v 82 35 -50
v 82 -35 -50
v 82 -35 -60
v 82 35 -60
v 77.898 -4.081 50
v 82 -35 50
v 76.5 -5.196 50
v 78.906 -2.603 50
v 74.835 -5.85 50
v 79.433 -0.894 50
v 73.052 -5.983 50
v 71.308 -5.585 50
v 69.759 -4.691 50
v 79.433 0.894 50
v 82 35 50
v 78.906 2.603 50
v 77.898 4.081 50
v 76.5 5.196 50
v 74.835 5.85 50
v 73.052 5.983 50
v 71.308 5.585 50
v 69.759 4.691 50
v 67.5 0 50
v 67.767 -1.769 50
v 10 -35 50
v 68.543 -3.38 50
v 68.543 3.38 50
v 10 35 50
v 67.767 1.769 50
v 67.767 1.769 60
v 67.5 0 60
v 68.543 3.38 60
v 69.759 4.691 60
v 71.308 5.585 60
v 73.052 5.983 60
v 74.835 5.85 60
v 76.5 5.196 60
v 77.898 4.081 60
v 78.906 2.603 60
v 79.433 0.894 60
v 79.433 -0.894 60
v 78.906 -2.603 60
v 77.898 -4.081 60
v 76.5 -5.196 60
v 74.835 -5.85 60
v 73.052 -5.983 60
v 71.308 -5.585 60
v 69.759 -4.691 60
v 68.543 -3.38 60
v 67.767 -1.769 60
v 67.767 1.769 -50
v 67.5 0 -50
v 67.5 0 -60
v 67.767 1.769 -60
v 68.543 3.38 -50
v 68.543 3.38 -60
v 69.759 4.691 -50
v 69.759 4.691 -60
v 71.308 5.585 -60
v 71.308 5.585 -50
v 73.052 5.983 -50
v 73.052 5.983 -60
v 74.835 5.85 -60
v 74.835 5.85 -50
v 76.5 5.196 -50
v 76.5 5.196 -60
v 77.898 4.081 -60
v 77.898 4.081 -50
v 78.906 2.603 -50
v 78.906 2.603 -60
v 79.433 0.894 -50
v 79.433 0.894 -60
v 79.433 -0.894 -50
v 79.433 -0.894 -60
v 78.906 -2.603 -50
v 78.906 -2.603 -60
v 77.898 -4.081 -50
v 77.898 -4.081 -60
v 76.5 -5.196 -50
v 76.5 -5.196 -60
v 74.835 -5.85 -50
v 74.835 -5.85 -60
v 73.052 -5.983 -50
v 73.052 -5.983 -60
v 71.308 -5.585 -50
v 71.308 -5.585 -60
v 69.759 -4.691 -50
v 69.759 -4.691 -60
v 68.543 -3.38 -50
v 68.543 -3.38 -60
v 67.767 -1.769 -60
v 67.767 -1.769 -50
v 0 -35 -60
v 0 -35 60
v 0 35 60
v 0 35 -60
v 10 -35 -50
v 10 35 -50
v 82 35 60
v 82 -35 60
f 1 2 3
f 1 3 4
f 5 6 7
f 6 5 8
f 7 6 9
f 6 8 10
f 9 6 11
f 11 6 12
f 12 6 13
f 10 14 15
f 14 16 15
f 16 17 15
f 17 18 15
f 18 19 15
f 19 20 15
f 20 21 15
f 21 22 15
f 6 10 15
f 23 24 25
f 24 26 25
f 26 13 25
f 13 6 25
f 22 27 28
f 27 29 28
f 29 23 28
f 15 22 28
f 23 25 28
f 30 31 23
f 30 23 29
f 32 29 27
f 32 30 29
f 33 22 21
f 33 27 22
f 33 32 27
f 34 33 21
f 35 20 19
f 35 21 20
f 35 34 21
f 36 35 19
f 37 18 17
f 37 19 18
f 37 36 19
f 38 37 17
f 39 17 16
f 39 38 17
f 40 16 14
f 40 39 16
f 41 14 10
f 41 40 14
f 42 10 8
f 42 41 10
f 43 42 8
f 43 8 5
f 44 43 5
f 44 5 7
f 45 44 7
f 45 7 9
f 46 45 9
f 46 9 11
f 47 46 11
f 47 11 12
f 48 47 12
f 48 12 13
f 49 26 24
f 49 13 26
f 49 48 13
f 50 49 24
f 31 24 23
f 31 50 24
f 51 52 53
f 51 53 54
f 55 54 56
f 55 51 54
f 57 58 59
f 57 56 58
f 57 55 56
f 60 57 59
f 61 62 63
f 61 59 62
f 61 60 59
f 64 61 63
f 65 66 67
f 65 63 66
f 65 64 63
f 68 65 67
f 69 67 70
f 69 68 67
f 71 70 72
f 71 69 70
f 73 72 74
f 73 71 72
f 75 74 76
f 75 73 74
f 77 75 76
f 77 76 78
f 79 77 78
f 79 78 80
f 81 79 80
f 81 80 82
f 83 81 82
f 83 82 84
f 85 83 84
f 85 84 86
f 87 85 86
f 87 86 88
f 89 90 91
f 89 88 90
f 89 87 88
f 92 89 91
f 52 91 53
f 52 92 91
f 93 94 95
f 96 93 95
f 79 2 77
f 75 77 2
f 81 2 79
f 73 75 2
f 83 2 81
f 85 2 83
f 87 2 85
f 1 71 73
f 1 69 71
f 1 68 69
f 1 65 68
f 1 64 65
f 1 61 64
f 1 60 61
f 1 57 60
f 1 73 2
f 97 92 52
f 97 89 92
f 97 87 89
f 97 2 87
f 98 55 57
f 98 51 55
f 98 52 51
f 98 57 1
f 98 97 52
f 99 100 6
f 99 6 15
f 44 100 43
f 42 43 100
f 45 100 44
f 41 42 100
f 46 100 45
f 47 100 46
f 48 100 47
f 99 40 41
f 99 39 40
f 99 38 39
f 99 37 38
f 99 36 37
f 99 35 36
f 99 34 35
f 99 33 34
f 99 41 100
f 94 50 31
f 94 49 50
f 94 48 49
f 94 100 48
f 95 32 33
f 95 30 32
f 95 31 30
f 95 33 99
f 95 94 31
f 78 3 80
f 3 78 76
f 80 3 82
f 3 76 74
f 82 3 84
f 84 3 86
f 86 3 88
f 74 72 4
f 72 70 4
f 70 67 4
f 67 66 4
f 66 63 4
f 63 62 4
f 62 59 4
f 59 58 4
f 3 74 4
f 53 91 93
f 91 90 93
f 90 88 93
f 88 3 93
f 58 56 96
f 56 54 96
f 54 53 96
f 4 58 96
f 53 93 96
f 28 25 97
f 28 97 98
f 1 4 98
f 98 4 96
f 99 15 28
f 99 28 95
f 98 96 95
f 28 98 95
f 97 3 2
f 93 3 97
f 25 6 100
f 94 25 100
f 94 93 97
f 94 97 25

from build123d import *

# Parameters (mm, degrees)
SKETCH1_W               = 70
SKETCH1_H               = 120
BOSS_EXTRUDE3_DEPTH     = 10
SKETCH3_W               = 70
SKETCH3_H               = 10
BOSS_EXTRUDE4_DEPTH     = 72
CUT_EXTRUDE1_DEPTH      = 150.49581934
CUT_EXTRUDE1_DEPTH_BACK = 150.49581934
SKETCH4_R               = 6


with BuildPart() as part:
    # Sketch1 → Boss-Extrude3 (new body)
    with BuildSketch(Plane.YZ):
        Rectangle(SKETCH1_W, SKETCH1_H)
    extrude(amount=BOSS_EXTRUDE3_DEPTH)

    # Sketch3 → Boss-Extrude4 (add)
    with BuildSketch(Plane.YZ.offset(10)):
        with Locations((0, 55)):
            Rectangle(SKETCH3_W, SKETCH3_H)
        with Locations((0, -55)):
            Rectangle(SKETCH3_W, SKETCH3_H)
    extrude(amount=BOSS_EXTRUDE4_DEPTH)

    # Sketch4 → Cut-Extrude1 (cut, two sides: drawn at the far end of the back side and taken through both)
    with BuildSketch(Plane(origin=(0, 0, -60), x_dir=(1, 0, 0), z_dir=(0, 0, -1)).offset(-CUT_EXTRUDE1_DEPTH_BACK)):
        with Locations(Location((73.5, 0, 0), (0, 0, 180))):
            Circle(SKETCH4_R)
    extrude(amount=CUT_EXTRUDE1_DEPTH + CUT_EXTRUDE1_DEPTH_BACK, mode=Mode.SUBTRACT)


solid = part.part
